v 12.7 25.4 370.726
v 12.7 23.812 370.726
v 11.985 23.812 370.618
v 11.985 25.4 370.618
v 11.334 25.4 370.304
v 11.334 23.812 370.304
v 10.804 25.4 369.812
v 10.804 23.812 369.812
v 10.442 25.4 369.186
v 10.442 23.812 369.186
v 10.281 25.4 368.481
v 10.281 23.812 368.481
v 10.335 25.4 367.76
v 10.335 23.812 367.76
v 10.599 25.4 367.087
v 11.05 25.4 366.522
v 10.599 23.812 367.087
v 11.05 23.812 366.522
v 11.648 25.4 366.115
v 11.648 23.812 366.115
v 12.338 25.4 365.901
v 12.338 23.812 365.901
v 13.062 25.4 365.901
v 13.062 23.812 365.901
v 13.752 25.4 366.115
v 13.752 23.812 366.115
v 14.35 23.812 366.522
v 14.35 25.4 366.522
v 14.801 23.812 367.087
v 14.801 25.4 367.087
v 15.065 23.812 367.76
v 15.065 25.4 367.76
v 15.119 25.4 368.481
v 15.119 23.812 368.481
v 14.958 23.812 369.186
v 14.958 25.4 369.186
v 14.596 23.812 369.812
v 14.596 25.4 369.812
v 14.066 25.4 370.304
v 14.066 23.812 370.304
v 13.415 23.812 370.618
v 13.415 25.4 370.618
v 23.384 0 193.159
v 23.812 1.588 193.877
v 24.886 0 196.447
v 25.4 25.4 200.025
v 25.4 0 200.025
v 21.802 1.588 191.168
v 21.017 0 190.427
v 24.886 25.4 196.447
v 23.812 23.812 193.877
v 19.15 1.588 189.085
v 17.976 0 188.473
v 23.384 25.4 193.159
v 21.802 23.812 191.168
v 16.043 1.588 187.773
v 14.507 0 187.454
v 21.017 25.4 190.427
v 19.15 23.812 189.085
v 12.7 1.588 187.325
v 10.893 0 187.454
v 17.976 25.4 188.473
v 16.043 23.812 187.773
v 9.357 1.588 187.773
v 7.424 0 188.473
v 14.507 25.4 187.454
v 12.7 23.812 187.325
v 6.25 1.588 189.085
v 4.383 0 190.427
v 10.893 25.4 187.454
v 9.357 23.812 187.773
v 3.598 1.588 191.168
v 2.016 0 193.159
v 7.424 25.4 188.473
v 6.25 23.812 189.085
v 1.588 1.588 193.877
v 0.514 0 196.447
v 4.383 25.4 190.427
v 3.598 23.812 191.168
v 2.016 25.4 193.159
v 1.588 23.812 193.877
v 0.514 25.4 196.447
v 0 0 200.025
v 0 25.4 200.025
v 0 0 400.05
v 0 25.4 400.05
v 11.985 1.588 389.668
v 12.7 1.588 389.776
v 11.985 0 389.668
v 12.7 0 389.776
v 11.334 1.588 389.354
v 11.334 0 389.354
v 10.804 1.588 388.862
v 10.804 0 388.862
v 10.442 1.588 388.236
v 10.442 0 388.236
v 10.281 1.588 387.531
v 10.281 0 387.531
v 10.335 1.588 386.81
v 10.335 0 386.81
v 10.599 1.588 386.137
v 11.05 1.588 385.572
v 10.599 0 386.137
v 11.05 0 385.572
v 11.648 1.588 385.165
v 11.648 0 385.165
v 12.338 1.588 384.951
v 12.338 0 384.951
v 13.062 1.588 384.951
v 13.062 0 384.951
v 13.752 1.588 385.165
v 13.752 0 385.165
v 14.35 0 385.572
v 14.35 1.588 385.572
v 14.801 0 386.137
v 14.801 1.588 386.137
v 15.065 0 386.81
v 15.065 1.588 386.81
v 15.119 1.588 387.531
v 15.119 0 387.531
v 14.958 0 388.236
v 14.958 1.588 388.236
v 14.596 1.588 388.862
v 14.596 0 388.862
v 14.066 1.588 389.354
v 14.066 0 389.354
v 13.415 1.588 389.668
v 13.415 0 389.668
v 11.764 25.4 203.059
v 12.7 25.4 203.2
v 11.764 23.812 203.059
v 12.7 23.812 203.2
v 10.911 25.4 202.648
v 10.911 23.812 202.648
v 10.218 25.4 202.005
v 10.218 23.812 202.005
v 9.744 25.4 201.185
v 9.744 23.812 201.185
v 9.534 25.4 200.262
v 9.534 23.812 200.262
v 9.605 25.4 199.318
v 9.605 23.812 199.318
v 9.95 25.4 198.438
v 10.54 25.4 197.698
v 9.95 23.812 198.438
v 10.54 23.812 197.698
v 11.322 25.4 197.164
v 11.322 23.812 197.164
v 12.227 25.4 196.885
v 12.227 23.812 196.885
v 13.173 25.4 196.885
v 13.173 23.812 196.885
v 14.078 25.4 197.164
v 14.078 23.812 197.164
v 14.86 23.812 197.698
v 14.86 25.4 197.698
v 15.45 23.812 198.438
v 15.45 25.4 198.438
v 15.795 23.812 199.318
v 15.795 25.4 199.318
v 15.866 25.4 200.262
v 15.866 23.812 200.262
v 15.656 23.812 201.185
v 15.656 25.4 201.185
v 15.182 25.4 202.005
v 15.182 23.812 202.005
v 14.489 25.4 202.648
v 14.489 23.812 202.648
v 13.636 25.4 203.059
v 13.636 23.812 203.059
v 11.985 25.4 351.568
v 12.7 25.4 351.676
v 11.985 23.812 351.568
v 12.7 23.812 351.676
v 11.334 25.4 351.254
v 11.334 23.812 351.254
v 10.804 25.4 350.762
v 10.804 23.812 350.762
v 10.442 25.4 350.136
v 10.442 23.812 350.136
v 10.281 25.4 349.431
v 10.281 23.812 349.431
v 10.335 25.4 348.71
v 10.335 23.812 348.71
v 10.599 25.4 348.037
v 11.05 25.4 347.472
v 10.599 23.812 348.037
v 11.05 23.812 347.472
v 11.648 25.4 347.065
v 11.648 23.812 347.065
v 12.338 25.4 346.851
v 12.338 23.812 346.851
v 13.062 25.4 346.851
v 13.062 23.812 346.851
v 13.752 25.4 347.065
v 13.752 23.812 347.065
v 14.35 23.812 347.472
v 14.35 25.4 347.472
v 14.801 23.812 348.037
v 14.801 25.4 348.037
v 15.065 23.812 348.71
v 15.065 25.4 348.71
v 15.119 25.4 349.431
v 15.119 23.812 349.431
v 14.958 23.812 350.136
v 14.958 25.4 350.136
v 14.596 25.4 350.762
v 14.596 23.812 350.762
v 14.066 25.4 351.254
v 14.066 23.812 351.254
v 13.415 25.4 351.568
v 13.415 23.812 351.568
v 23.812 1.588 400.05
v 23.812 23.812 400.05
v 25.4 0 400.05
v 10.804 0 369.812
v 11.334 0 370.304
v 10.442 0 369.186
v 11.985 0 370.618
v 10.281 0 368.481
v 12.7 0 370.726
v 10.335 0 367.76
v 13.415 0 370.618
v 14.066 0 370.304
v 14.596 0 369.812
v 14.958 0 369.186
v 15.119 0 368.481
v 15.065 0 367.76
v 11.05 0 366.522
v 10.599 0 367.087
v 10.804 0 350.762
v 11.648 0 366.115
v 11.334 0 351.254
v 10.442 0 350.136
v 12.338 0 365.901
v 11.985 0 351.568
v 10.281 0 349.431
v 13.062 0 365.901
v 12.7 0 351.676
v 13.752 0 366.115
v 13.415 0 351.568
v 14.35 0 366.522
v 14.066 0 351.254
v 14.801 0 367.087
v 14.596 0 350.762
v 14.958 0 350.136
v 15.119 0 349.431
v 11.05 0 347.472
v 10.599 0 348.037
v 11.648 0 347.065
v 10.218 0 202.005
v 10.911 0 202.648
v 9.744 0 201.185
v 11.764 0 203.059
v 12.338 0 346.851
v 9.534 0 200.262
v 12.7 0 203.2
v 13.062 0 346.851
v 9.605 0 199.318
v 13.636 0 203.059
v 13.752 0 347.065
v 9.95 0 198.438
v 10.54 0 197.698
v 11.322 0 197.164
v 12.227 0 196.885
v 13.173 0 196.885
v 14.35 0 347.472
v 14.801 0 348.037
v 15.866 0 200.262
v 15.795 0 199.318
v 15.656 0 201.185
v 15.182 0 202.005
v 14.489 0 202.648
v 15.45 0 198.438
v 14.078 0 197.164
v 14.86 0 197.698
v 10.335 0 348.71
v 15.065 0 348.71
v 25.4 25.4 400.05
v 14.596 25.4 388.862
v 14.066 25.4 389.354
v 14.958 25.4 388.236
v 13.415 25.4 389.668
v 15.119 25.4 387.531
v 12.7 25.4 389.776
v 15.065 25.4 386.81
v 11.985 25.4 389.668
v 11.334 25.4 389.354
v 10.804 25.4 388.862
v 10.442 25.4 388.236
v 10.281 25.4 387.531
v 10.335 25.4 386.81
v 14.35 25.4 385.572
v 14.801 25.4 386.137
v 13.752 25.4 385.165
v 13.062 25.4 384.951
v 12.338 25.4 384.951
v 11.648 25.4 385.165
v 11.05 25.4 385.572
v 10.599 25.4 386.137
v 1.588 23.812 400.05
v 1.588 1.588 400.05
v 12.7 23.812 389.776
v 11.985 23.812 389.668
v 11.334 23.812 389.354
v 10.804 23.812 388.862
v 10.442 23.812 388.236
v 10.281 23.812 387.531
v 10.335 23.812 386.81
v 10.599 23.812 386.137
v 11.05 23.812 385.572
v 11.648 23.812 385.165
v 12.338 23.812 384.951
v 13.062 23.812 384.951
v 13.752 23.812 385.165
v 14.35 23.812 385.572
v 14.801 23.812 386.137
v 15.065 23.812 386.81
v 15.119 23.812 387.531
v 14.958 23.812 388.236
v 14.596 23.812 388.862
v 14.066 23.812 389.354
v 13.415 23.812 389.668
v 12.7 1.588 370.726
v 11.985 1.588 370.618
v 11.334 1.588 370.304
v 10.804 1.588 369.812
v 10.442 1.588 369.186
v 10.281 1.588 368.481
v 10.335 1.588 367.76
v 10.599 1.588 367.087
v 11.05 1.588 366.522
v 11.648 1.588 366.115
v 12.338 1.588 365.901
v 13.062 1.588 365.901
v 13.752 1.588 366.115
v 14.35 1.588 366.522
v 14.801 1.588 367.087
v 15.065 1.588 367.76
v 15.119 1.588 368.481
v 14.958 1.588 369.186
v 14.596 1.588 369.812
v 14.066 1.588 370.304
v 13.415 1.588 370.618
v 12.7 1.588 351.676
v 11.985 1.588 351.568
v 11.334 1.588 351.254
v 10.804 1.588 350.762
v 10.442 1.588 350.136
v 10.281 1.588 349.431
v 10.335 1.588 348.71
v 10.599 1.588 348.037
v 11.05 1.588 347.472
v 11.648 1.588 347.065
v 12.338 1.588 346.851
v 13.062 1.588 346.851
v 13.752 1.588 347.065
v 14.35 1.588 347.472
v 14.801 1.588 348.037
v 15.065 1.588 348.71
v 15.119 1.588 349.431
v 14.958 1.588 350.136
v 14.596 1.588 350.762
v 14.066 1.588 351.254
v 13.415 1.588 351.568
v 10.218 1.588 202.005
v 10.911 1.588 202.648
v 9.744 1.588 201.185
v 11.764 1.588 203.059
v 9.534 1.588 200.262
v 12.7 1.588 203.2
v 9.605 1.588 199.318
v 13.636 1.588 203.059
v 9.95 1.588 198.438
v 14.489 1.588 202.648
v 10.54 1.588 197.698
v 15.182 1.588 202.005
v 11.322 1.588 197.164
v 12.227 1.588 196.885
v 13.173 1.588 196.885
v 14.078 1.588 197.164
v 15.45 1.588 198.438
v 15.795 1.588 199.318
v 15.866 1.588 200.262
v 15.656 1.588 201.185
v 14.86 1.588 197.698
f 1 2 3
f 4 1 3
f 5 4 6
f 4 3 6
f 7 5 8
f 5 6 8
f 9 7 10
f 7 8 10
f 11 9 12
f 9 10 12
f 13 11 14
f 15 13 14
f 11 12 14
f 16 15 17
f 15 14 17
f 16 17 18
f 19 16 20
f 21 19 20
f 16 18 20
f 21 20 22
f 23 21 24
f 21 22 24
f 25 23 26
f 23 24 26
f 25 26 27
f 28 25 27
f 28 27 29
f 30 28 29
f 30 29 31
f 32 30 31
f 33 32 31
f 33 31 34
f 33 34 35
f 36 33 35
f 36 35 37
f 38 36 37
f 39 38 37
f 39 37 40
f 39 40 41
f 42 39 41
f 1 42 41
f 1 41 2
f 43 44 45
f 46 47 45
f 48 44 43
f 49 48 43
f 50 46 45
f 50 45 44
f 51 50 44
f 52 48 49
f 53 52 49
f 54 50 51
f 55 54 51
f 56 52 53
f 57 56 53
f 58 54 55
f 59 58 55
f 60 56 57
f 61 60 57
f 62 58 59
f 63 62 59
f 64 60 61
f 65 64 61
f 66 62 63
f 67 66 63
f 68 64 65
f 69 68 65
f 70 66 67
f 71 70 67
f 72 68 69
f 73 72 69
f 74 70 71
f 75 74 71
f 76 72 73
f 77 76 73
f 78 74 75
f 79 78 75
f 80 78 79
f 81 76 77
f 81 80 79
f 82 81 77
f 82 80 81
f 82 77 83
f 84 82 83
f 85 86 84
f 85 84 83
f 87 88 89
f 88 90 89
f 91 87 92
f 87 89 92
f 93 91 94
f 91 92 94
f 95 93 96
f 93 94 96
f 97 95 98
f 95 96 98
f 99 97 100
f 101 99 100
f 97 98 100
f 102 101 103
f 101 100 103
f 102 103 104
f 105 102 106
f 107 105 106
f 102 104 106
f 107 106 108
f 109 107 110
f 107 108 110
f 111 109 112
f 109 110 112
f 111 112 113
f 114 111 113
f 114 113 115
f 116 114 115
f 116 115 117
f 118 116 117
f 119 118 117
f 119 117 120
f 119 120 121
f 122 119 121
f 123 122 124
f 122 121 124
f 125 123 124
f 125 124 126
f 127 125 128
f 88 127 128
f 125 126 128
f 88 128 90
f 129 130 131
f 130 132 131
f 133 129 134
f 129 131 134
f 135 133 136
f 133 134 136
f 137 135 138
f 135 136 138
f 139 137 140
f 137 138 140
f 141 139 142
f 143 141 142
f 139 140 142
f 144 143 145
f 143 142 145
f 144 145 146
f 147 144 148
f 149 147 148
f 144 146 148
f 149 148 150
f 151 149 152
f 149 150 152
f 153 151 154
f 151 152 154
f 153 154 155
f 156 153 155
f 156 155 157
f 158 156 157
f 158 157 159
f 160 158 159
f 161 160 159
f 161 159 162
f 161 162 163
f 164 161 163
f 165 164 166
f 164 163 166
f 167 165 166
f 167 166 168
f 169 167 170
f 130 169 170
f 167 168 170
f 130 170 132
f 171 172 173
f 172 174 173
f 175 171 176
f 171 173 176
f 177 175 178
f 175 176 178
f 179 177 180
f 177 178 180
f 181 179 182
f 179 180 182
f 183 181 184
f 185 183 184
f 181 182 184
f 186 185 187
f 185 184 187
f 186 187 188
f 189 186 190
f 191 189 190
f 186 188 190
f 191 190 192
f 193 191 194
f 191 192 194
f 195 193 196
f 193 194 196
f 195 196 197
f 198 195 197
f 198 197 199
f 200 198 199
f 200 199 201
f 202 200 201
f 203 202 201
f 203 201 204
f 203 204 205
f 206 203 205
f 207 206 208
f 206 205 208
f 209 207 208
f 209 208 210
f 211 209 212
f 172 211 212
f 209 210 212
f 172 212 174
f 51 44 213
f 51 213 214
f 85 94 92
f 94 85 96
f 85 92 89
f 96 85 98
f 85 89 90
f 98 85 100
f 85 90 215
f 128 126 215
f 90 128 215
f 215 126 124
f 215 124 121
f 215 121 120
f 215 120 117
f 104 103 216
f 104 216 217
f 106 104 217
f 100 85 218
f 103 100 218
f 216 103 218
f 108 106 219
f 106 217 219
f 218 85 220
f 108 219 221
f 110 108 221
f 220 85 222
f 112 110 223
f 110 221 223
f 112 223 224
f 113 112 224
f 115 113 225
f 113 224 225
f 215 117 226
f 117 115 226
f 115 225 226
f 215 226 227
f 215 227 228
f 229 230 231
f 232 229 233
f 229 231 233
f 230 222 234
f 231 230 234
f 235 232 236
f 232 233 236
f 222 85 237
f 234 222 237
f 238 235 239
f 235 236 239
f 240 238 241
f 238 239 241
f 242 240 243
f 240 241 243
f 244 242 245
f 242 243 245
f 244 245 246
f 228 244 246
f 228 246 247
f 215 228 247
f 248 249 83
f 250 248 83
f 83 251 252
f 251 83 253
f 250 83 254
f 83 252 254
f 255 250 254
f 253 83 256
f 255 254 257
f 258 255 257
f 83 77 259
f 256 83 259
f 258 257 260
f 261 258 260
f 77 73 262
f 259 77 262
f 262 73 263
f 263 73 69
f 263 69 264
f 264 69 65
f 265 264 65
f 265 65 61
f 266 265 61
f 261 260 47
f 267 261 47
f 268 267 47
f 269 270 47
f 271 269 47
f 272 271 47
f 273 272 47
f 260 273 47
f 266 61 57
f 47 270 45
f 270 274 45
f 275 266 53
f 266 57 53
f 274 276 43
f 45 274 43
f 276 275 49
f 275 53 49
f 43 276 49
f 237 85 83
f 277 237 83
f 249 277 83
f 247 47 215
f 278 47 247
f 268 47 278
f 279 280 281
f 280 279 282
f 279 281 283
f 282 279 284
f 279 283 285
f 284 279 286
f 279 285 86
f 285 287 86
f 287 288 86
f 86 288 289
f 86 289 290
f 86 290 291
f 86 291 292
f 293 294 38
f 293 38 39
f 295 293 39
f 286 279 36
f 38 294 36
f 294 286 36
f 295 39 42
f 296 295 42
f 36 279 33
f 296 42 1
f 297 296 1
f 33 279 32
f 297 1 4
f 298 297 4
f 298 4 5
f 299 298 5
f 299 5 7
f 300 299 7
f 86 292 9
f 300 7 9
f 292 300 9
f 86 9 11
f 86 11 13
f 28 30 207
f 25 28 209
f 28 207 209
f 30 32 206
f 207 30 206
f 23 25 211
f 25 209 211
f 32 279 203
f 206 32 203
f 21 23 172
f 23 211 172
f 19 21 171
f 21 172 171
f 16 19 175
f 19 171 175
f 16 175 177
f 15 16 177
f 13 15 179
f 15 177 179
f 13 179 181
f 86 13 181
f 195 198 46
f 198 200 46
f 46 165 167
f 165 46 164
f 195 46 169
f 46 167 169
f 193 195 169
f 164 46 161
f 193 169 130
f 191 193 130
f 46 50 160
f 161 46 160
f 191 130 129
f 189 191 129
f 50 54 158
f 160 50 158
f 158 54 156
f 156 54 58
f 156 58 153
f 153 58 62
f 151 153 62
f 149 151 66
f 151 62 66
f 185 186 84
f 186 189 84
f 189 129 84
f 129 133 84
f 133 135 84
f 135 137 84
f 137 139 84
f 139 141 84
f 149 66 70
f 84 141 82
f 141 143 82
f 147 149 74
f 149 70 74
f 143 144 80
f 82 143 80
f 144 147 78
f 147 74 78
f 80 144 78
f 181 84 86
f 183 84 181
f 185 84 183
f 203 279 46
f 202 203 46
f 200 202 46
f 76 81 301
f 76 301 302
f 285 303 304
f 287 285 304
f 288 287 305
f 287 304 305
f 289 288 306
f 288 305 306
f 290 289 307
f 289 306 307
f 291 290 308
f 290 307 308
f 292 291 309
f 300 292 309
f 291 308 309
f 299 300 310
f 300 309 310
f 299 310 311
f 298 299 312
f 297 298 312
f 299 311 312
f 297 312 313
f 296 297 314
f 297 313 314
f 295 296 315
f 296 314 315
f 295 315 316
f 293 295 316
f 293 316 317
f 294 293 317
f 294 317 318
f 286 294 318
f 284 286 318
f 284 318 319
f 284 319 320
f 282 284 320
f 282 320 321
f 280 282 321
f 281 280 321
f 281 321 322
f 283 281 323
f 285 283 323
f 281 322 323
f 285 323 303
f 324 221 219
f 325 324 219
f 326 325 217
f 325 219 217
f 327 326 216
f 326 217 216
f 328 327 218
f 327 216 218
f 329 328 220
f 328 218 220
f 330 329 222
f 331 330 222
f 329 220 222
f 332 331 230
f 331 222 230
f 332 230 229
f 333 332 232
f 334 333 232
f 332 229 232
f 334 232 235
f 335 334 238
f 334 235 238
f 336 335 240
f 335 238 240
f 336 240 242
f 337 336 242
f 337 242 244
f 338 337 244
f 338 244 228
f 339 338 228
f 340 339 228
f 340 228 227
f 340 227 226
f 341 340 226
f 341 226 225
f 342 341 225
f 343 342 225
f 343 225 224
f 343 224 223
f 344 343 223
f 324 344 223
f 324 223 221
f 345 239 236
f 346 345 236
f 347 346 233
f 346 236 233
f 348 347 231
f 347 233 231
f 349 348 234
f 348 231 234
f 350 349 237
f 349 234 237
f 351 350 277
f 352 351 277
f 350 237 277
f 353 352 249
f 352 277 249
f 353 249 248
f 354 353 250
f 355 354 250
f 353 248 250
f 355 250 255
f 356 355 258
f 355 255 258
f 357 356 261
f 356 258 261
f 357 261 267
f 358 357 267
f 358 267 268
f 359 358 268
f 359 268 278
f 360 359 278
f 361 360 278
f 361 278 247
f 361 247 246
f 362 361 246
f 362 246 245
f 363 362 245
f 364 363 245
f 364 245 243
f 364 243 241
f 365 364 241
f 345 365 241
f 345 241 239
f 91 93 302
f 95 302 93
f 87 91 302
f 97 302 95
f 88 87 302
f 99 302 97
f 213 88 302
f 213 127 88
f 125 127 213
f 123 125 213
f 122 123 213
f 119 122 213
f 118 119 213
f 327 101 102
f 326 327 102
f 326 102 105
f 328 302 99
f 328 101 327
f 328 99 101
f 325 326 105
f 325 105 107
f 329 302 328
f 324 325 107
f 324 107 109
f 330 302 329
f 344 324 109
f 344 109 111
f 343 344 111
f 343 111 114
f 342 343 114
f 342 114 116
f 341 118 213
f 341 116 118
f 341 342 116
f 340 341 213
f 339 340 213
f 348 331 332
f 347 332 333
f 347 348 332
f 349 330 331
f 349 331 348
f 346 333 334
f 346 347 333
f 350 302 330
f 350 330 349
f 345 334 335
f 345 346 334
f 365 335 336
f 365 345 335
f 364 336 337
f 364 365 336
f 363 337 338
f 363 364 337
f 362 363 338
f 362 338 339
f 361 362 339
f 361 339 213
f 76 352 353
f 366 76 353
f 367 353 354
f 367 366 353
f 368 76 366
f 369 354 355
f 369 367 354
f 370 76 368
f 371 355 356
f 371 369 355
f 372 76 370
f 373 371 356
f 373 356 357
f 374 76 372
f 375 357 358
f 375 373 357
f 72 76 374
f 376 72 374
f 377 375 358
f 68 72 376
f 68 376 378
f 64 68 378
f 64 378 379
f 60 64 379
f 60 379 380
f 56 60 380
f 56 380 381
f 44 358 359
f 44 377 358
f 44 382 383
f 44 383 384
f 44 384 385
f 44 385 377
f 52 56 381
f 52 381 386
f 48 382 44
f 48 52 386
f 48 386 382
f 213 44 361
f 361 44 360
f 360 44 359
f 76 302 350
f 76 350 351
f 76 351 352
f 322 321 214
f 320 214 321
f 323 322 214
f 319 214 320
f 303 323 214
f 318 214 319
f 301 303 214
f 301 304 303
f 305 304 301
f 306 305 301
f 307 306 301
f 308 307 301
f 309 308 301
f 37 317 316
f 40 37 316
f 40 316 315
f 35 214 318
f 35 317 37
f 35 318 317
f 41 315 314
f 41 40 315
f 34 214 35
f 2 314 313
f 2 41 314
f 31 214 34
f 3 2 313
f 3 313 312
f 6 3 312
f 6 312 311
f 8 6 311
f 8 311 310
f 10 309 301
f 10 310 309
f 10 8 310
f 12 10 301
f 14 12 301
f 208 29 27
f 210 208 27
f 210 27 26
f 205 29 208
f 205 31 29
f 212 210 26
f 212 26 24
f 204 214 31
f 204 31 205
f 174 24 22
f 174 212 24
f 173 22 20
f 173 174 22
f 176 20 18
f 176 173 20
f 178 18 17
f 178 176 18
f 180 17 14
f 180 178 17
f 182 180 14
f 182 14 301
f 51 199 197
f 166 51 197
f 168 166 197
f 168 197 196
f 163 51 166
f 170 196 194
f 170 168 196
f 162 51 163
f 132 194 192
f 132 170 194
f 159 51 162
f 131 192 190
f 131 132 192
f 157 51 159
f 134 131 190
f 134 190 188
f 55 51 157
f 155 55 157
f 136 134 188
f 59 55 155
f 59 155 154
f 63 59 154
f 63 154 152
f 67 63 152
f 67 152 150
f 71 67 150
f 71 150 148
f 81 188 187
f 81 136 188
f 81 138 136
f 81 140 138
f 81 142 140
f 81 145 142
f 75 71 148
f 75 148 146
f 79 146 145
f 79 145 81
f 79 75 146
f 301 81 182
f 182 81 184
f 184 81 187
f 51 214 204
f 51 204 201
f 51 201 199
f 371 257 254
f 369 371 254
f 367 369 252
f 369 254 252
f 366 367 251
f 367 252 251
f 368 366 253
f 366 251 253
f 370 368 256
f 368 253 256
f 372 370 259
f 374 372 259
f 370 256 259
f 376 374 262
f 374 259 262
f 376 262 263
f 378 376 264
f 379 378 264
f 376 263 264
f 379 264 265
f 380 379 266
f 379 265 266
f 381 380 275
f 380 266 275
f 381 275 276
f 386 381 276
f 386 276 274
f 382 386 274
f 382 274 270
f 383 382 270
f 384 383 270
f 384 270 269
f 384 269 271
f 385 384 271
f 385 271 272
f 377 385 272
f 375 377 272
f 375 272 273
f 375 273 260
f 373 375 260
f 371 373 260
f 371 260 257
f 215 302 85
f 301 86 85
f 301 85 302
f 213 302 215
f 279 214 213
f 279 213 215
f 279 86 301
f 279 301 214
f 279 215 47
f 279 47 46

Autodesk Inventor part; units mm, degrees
ref_plane "YZ Plane" through (0, 0, 0) normal (1, 0, 0) x (0, 1, 0)
ref_plane "XZ Plane" through (0, 0, 0) normal (0, 1, 0) x (-1, 0, 0)
ref_plane "XY Plane" through (0, 0, 0) normal (0, 0, 1) x (1, 0, 0)
sketch "Sketch1" plane through (0, 0, 0) normal (0, 0, 1) x (1, 0, 0)
  line L0 (0, 0) -> (25.4, 0)
  line L1 (25.4, 0) -> (25.4, 25.4)
  line L2 (25.4, 25.4) -> (0, 25.4)
  line L3 (0, 25.4) -> (0, 0)
  line L4 (1.5875, 1.5875) -> (23.8125, 1.5875)
  line L5 (23.8125, 1.5875) -> (23.8125, 23.8125)
  line L6 (23.8125, 23.8125) -> (1.5875, 23.8125)
  line L7 (1.5875, 23.8125) -> (1.5875, 1.5875)
  dimension "d0" = 25.4
  dimension "d1" = 25.4
  dimension "d2" = 1.5875
extrude "Extrusion1" add sketch "Sketch1" along normal blind 400.05
sketch "Sketch3" plane through (0, 25.4, 0) normal (0, 1, 0) x (1, 0, 0)
  line L0 (25.4, 0) -> (0, 0) projected
  line L1 (0, 0) -> (0, -400.05) projected
  line L2 (25.4, -400.05) -> (0, -400.05) projected
  line L3 (25.4, 0) -> (25.4, -400.05) projected
  point P0 (0, 0)
  point P1 (12.7, -200.025)
  dimension "d15" = 200.025
  dimension "d16" = 400.05
  dimension "d17" = 12.7
hole "Hole2" at (12.7, 25.4, 200.025) direction (0, -1, 0) diameter 6.35 end through all clearance for "Flat Head Machine Screw (82)" size "1/4" standard "Ansi Unified Screw Threads"
sketch "Sketch7" plane through (0, 25.4, 0) normal (0, 1, 0) x (1, 0, 0)
  line L0 (0, 0) -> (0, -400.05) projected
  line L1 (25.4, 0) -> (25.4, -400.05) projected
  line L2 (25.4, 0) -> (0, 0) projected
  line L3 (0, 0) -> (25.4, 0) projected
  line L4 (0, -200.025) -> (0, 0)
  line L5 (25.4, 0) -> (25.4, -200.025)
  line L6 (0, 0) -> (25.4, 0)
  arc A0 (25.4, -200.025) -> (0, -200.025) centre (12.7, -200.025) ccw
  line L7 (25.4, -400.05) -> (0, -400.05) projected
  circle A1 centre (12.7, -200.025) radius 3.175 projected
  line L8 (25.4, 0) -> (0, 0) projected
  line L9 (0, 0) -> (0, -400.05) projected
  line L10 (25.4, -400.05) -> (0, -400.05) projected
  line L11 (25.4, 0) -> (25.4, -400.05) projected
extrude "Extrusion3" cut sketch "Sketch7" against normal blind 25.4 contours L2 L1 A0 L0
sketch "Sketch8" plane through (0, 25.4, 400.05) normal (0, 1, 0) x (1, 0, 0)
  line L0 (25.4, 0) -> (0, 0) projected
  line L1 (0, 200.025) -> (0, 0) projected
  point P0 (0, 400.05)
  point P1 (12.7, 12.7)
  point P2 (12.7, 31.75)
  point P3 (12.7, 50.8)
  dimension "d43" = 12.7
  dimension "d44" = 12.7
  dimension "d55" = 19.05
  dimension "d56" = 19.05
hole "Hole4" at (12.7, 25.4, 387.35) at (12.7, 25.4, 368.3) at (12.7, 25.4, 349.25) direction (0, -1, 0) diameter 4.8514 end through all
equation "\"d15\" = 0.5 * d16"
properties part number "CLB_036_FourPartScissorBarTop" material "Aluminum 6061"
